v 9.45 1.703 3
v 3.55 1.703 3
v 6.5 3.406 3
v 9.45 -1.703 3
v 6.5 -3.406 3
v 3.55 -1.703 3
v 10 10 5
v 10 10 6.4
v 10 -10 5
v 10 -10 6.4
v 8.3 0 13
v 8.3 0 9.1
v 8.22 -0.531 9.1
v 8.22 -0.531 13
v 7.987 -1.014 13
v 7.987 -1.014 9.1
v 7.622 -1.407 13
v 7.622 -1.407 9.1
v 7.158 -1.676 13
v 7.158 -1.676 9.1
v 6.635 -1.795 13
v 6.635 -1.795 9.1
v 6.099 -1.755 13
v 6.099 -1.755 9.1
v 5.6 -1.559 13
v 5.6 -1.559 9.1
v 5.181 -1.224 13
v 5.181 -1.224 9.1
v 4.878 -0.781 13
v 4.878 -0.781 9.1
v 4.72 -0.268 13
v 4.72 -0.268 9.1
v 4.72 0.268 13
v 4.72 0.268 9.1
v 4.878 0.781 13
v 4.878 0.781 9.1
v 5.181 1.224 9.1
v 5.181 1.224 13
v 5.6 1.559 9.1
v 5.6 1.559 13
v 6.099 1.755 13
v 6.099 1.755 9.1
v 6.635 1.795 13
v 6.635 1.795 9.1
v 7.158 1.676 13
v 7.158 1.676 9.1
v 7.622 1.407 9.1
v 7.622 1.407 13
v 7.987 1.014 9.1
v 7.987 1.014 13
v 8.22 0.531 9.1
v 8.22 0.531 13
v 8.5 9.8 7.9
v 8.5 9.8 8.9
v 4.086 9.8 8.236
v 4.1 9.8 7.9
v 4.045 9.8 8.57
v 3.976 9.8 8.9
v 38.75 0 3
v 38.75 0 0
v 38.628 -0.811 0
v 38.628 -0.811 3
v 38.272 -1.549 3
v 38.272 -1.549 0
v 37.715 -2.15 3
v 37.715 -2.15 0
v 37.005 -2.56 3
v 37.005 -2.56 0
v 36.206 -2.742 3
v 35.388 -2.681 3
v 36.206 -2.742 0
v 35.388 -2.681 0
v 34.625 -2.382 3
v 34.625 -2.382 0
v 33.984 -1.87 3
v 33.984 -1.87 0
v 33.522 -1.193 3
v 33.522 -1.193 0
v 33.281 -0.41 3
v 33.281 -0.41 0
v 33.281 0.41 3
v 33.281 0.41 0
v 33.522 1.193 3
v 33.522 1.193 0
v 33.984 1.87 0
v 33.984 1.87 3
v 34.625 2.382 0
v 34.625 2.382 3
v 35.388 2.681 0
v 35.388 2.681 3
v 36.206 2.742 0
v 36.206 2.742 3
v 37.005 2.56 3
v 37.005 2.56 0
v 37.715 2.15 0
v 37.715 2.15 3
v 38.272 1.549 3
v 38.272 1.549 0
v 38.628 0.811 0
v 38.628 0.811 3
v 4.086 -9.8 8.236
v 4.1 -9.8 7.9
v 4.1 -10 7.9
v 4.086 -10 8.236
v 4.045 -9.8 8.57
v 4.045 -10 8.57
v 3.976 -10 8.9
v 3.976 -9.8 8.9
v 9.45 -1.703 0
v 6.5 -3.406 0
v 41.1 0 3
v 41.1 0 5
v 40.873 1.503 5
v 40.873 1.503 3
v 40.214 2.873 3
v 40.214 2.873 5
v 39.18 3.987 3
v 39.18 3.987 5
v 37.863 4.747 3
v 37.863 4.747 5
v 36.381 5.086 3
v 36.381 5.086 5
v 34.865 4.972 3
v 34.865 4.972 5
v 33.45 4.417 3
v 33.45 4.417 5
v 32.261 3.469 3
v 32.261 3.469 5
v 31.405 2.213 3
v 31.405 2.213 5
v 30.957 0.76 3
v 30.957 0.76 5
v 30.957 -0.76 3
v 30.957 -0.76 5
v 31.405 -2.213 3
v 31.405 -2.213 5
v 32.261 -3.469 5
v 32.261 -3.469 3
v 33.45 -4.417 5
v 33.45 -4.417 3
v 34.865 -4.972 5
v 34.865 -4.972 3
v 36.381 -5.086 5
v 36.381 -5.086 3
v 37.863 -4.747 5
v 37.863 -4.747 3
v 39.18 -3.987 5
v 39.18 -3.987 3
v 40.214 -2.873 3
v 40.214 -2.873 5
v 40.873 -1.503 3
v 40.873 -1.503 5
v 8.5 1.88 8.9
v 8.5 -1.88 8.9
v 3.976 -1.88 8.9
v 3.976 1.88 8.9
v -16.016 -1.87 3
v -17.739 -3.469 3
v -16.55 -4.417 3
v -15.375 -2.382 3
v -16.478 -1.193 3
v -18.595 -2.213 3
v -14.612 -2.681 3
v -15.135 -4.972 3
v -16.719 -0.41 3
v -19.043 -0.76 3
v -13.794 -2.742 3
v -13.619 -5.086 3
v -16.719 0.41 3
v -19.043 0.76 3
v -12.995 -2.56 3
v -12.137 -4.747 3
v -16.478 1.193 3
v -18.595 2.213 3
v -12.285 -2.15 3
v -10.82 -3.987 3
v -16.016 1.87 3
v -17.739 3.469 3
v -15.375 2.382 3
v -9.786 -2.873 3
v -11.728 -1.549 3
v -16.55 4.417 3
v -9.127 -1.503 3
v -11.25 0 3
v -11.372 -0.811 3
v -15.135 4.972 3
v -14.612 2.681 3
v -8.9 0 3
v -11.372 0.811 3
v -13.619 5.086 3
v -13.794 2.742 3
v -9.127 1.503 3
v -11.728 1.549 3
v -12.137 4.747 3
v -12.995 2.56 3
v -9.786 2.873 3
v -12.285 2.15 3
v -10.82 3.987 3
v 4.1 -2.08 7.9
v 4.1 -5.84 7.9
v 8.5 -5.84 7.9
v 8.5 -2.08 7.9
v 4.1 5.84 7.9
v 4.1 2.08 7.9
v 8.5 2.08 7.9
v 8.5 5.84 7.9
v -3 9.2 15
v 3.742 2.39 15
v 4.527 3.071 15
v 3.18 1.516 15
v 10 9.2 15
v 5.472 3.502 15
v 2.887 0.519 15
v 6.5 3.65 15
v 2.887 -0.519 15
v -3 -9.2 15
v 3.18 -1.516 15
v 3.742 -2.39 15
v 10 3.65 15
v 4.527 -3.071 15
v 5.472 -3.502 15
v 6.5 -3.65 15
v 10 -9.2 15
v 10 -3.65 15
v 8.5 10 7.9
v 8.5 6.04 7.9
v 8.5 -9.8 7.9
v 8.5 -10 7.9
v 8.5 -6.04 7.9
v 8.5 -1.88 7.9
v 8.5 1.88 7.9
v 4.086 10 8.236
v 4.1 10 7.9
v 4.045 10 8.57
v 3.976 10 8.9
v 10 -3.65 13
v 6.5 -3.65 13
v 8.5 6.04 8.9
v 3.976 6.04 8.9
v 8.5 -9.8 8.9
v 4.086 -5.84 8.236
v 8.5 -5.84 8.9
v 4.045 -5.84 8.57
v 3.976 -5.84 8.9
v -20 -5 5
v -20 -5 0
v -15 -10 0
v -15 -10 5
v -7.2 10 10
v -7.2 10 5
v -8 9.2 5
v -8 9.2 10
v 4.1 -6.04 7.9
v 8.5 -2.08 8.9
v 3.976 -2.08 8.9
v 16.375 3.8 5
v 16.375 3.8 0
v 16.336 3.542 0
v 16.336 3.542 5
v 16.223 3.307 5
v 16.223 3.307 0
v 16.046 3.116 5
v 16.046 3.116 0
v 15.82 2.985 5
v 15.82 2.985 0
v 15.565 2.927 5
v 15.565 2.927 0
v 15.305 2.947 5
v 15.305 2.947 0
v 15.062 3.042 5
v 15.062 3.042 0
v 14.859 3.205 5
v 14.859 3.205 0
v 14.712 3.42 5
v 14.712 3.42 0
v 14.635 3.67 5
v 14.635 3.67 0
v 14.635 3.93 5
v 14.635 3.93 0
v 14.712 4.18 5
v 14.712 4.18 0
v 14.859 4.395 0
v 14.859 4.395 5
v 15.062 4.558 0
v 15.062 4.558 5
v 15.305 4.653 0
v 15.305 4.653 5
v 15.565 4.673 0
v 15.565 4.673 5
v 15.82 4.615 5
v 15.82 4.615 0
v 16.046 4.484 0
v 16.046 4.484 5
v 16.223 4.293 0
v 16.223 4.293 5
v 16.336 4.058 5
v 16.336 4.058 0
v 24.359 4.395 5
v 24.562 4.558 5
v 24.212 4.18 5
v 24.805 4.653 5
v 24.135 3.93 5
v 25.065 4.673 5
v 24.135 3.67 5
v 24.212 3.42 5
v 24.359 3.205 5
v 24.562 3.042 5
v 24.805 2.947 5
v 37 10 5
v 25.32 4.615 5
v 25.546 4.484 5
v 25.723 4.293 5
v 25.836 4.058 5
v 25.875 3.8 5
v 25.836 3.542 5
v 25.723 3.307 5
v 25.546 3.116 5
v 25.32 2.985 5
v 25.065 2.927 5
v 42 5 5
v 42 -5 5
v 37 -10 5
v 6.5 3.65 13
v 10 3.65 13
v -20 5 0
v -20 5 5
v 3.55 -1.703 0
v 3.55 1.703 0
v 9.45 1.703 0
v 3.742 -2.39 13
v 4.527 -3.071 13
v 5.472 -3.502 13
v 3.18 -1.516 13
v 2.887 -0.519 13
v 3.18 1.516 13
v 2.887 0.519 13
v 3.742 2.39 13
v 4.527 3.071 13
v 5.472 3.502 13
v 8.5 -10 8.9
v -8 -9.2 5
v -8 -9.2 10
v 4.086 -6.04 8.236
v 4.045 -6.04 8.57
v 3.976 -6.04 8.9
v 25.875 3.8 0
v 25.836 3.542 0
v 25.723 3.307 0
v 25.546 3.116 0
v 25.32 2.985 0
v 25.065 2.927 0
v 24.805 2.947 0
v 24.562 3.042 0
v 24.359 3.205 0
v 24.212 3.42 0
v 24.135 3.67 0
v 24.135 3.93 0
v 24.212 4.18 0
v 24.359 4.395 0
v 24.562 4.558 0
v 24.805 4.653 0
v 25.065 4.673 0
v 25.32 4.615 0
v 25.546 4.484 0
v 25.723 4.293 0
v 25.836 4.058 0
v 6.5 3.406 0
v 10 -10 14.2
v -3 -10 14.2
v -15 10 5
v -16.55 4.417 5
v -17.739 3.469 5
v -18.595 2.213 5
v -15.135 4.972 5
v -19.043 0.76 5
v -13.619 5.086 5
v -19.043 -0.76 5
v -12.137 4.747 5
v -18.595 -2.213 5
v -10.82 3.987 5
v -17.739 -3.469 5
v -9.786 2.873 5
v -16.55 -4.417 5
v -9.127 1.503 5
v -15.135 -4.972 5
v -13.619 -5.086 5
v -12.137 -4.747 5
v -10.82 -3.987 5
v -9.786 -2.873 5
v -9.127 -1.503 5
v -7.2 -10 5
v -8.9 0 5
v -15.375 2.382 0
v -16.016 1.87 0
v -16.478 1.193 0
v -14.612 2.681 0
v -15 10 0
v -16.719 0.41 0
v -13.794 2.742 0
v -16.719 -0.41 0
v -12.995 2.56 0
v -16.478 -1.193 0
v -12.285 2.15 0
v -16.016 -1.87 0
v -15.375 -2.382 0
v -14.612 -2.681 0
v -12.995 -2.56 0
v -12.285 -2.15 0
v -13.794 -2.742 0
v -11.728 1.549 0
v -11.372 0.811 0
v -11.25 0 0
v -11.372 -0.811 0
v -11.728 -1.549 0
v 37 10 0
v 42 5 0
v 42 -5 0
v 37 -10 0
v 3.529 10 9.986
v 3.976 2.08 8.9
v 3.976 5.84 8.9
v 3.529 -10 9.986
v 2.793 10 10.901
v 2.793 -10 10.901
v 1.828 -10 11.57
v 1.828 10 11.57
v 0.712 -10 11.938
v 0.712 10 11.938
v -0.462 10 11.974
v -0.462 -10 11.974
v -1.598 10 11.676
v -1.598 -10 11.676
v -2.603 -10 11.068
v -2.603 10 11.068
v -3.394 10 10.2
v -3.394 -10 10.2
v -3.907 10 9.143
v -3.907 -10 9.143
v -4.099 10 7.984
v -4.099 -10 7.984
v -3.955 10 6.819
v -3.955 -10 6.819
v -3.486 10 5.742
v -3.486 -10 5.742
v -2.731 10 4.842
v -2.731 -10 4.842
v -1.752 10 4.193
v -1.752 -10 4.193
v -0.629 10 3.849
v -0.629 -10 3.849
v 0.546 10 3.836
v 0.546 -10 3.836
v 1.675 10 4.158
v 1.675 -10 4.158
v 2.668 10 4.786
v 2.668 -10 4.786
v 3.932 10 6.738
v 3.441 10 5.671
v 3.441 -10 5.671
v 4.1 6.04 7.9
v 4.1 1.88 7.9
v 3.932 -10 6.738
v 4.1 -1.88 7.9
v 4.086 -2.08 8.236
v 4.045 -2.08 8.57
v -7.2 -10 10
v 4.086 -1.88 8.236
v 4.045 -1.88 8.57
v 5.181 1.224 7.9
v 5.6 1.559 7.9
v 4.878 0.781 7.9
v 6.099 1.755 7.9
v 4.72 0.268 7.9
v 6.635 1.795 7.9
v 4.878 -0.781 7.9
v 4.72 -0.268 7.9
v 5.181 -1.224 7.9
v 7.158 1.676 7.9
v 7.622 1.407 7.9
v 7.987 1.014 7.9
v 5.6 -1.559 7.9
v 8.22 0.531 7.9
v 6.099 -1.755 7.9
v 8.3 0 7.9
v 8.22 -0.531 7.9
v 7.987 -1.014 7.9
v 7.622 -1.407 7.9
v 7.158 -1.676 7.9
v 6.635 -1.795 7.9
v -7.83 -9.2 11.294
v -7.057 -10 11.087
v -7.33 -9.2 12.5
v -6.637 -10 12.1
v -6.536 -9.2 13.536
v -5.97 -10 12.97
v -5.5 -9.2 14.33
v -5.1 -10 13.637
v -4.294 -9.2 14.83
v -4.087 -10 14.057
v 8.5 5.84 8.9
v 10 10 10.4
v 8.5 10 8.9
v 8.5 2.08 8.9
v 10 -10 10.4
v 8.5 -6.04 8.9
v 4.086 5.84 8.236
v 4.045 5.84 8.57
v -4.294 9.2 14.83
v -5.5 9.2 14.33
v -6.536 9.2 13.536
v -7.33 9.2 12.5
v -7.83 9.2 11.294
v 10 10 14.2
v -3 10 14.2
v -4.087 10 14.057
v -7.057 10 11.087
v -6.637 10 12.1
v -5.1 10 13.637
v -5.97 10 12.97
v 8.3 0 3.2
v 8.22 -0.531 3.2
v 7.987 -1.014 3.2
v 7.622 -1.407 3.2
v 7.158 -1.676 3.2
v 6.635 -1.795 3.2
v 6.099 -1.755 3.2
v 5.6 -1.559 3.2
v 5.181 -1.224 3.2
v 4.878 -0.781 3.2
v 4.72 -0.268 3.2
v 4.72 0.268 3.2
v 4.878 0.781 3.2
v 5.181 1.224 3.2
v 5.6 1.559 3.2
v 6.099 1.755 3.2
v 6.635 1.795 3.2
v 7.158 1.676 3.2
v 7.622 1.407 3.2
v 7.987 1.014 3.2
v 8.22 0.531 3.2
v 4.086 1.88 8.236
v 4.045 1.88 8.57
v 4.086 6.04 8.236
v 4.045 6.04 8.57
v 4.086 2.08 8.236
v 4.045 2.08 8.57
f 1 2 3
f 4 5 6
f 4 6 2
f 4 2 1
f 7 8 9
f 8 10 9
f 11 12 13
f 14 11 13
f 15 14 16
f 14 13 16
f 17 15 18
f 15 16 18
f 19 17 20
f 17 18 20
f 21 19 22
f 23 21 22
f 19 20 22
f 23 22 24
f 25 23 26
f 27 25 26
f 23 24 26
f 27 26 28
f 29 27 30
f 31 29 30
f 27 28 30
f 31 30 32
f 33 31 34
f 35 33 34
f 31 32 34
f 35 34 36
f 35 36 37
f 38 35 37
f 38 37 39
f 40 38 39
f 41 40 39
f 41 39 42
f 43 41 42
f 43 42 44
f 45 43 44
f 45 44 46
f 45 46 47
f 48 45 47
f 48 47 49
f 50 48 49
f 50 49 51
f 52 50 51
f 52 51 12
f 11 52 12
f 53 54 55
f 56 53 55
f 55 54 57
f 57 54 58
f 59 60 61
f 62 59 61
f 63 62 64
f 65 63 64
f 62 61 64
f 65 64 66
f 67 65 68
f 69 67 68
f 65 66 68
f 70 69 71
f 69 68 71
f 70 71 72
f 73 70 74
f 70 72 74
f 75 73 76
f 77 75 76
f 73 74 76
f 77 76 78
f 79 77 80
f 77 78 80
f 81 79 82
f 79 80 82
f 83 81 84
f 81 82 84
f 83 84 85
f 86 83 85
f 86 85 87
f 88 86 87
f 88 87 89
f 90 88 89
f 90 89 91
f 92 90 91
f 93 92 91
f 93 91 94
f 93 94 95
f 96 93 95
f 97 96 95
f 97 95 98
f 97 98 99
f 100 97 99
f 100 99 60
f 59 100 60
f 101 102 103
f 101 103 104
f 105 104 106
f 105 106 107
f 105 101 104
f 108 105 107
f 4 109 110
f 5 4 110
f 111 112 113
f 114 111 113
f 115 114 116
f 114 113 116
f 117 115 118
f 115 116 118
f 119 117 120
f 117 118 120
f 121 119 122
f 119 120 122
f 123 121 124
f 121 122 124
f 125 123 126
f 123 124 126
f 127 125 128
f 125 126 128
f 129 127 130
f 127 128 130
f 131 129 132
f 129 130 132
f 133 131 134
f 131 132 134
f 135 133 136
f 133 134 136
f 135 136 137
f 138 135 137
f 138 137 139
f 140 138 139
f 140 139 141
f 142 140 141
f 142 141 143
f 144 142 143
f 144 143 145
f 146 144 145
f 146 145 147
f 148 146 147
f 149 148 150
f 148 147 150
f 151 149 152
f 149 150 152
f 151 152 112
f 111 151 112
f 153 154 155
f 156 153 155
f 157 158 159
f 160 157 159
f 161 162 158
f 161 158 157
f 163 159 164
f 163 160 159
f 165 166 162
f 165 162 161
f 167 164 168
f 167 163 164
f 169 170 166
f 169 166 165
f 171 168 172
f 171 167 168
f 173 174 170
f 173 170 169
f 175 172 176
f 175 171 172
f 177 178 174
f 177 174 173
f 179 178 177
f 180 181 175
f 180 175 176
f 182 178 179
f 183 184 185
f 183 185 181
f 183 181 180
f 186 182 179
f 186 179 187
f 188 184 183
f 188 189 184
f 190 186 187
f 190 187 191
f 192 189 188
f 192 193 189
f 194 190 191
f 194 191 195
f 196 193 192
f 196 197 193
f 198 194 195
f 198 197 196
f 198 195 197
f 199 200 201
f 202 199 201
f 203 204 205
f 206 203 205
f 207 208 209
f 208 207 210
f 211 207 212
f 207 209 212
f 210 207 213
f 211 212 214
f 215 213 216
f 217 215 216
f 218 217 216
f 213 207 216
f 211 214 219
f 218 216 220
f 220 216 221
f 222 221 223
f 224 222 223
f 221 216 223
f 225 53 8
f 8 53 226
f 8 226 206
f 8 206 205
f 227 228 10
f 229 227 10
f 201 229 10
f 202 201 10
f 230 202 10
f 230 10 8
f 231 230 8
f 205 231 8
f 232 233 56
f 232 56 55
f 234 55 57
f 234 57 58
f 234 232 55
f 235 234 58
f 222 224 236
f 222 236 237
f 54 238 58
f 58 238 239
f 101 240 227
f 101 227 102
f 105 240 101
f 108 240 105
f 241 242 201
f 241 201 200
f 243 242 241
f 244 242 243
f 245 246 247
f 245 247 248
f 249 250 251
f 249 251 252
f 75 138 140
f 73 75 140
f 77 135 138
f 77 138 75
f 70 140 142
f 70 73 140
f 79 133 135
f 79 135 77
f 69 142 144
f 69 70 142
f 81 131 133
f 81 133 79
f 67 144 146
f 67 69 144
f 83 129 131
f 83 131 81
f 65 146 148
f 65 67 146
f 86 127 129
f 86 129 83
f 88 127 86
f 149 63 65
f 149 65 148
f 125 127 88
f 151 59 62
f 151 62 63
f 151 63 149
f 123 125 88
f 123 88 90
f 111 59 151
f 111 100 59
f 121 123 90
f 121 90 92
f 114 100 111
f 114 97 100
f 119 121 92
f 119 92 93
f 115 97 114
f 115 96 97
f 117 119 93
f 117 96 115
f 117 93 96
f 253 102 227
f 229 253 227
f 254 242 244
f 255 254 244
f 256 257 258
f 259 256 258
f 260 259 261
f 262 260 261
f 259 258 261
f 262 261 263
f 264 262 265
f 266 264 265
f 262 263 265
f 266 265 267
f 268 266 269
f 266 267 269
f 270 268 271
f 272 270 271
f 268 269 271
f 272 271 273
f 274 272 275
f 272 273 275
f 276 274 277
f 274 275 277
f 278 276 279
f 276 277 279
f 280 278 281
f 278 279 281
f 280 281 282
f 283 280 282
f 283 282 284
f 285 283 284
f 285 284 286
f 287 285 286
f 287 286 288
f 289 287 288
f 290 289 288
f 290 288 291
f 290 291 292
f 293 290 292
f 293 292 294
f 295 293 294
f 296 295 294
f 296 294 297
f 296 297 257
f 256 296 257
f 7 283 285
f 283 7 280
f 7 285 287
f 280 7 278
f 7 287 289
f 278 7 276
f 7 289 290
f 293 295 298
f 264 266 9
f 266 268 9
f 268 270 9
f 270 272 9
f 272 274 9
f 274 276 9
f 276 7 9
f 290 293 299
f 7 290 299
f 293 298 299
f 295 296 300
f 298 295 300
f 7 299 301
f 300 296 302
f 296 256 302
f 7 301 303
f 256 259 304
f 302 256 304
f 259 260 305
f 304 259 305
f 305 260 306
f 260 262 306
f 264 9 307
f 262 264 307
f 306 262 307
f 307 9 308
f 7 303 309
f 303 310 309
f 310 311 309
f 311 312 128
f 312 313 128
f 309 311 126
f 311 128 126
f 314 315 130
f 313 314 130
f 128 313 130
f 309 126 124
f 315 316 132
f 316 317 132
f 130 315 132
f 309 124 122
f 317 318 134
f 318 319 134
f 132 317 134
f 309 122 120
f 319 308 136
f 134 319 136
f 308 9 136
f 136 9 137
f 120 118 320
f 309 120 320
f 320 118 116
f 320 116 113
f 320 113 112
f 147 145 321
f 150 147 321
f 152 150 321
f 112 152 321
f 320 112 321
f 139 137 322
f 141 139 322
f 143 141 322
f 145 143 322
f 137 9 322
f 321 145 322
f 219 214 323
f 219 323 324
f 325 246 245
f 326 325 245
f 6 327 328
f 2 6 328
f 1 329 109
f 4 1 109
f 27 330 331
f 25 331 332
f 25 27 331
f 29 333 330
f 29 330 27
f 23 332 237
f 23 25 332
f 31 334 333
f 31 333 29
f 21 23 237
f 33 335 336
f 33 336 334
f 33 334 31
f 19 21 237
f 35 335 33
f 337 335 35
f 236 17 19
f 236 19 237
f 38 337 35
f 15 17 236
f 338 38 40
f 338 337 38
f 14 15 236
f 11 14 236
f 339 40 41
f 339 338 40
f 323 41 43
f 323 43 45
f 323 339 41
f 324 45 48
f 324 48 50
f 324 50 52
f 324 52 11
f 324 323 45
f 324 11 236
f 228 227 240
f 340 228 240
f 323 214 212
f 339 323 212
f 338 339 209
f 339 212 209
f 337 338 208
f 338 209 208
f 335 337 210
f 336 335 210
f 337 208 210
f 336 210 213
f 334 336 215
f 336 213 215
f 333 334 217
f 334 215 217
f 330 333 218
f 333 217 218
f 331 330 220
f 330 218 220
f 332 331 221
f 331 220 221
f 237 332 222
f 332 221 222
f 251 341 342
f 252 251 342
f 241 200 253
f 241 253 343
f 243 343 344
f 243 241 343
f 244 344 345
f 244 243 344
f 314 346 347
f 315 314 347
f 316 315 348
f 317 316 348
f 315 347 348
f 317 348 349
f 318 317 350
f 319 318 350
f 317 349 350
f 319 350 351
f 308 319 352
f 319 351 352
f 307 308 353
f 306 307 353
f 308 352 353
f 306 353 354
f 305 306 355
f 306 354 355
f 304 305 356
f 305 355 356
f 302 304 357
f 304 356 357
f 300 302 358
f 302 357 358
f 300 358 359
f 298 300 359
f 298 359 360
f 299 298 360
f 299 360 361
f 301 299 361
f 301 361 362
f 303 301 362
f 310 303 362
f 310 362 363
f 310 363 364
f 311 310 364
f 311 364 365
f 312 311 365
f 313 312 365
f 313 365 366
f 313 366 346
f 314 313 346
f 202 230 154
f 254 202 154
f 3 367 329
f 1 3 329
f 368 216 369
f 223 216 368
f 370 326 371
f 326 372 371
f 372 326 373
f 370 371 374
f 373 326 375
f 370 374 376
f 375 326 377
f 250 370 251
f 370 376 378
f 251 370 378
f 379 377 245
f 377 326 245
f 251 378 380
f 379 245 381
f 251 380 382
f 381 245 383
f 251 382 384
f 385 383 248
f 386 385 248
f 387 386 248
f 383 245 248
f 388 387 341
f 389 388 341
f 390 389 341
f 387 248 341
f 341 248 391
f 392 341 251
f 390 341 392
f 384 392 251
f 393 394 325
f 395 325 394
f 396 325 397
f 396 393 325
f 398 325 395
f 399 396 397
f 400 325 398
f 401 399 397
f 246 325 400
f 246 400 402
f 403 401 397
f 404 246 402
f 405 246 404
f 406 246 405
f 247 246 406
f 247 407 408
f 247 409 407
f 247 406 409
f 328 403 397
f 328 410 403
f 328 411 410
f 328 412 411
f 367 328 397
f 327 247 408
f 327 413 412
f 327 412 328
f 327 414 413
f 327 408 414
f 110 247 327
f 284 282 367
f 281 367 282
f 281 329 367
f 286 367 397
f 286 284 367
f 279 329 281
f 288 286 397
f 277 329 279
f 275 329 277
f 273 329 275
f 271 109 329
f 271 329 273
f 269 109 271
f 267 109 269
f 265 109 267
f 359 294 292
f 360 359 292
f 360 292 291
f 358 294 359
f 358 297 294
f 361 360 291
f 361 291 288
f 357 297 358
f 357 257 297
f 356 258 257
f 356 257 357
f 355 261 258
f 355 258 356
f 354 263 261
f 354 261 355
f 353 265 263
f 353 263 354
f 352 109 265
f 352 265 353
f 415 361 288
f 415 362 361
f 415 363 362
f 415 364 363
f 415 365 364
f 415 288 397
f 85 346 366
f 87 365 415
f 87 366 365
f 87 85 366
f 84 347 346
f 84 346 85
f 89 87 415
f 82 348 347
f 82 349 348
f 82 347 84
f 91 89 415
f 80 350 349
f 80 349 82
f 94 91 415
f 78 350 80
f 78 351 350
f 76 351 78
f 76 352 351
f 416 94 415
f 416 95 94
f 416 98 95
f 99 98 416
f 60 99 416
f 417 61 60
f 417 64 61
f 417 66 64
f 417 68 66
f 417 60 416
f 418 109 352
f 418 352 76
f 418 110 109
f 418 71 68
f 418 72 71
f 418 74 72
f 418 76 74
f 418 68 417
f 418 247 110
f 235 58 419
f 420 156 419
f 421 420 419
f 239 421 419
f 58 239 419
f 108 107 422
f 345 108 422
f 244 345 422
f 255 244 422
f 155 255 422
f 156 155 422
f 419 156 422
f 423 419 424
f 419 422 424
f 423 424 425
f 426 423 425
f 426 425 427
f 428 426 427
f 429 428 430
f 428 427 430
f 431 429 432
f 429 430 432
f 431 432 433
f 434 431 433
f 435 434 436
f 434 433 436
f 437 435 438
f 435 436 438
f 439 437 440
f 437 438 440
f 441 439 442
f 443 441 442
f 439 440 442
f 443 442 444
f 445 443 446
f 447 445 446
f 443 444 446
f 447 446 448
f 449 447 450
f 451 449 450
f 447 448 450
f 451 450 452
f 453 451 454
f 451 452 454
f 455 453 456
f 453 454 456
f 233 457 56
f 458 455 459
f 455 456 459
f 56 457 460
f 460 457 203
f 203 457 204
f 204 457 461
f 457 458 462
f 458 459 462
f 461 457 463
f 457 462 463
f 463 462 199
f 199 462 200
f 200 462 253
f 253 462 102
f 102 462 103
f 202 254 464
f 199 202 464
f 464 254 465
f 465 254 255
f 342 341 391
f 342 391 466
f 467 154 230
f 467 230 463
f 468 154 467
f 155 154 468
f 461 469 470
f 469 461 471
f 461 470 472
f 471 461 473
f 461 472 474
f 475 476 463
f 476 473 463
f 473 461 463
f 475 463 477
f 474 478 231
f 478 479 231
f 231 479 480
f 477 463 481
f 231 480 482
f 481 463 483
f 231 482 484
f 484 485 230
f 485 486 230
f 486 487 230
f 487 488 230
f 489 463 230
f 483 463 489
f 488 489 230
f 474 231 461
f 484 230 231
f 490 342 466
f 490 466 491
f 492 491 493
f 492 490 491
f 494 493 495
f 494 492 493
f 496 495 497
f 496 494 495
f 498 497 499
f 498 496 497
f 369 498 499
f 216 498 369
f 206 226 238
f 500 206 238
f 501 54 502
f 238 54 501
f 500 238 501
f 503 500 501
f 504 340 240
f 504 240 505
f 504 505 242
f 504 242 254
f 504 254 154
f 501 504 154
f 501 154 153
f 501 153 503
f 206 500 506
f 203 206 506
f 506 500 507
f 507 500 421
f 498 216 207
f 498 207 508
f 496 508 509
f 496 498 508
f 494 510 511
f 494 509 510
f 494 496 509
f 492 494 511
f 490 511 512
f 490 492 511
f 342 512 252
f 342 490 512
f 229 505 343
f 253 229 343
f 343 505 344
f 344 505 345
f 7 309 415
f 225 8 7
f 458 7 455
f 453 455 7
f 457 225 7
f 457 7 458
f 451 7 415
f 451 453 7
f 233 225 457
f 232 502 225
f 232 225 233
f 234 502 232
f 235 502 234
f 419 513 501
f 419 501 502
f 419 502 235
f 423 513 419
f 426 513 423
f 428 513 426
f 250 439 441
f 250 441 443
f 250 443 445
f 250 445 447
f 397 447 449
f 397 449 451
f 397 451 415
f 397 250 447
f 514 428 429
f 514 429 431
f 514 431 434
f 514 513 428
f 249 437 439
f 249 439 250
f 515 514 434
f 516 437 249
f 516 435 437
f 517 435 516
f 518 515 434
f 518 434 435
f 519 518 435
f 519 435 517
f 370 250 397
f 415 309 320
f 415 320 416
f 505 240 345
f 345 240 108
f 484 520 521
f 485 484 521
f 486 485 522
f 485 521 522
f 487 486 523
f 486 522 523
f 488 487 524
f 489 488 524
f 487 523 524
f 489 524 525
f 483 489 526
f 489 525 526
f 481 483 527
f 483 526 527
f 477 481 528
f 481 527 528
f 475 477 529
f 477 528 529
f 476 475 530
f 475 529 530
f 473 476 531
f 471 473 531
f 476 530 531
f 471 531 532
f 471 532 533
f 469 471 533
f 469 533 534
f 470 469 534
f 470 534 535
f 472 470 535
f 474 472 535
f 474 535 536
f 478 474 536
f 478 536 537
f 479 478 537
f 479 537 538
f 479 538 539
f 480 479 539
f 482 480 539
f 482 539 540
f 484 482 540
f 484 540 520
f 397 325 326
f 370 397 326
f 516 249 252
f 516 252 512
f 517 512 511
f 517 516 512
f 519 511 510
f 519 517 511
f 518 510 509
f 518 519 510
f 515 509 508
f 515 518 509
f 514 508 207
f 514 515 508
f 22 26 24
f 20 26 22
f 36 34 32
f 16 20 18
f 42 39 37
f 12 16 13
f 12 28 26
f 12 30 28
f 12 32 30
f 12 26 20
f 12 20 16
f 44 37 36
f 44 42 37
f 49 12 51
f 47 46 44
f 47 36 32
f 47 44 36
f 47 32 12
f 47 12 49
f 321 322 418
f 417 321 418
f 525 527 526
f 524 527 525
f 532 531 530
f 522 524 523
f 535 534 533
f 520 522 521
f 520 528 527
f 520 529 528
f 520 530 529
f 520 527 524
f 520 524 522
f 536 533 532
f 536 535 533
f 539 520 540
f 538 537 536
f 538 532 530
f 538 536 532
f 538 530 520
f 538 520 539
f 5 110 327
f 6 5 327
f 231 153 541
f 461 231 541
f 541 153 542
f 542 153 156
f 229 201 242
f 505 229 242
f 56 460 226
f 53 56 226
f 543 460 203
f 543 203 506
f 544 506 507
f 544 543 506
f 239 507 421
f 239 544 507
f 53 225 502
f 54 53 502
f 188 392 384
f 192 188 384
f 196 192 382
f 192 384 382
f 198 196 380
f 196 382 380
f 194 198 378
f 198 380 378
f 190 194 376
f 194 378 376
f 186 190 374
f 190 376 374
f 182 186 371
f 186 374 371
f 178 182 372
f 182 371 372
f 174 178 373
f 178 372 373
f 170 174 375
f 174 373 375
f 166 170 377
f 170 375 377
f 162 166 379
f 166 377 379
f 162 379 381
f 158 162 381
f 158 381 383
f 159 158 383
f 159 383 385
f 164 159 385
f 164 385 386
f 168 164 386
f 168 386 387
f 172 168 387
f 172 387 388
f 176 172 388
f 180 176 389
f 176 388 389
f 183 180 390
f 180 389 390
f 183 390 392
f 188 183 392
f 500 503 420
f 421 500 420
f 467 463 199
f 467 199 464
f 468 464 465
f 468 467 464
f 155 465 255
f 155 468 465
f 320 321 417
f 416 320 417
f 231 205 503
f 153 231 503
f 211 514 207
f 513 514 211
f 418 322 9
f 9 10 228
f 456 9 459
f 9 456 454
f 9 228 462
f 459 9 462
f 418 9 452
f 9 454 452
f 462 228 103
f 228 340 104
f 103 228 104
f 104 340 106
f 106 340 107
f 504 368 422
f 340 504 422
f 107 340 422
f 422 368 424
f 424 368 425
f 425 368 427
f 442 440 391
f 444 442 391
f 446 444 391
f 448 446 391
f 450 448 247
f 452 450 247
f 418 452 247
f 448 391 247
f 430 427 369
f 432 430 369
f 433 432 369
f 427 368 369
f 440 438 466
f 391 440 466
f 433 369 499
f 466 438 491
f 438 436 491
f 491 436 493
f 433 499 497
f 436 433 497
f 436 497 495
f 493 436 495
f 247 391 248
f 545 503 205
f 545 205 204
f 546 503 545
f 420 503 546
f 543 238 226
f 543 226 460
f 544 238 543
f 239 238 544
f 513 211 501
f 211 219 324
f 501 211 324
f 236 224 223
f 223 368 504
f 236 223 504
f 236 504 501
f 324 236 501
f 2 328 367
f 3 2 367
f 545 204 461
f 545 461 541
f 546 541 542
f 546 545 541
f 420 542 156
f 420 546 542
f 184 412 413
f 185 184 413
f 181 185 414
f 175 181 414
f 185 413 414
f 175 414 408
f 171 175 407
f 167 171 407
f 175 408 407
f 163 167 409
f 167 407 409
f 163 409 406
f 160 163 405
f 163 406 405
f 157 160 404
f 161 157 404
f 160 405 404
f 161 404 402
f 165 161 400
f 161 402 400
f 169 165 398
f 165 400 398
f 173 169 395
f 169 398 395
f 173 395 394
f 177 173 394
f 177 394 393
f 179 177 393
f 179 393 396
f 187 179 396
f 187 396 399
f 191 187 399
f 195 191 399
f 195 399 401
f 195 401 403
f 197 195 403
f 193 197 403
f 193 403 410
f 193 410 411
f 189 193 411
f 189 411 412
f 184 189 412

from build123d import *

# Parameters (mm, degrees)
PAD_DEPTH           = 10
SKETCH001_R         = 2.75
SKETCH001_R_2       = 1.8
SKETCH001_R_3       = 0.875
POCKET_DEPTH        = 15.001
POCKET001_DEPTH     = 3
SKETCH003_R         = 5.1
POCKET002_DEPTH     = 2
SKETCH004_R         = 1.9
PAD001_DEPTH        = 0.2
SKETCH005_R         = 2.95
PAD002_DEPTH        = 0.2
PAD003_DEPTH        = 0.2
LINEARPATTERN_COUNT = 6
LINEARPATTERN_PITCH = 3.96
POCKET003_DEPTH     = 2
CHAMFER_SIZE        = 5
CHAMFER001_SIZE     = 0.8


with BuildPart() as part:
    # Sketch → Pad (new body, symmetric)
    with BuildSketch(Plane.XZ):
        with BuildLine():
            ThreePointArc((3.976179, 8.9), (-4.068927, 7.396182), (4.1, 7.9))
            Line((4.1, 7.9), (8.5, 7.9))
            Line((8.5, 7.9), (10, 6.4))
            Line((10, 6.4), (10, 5))
            Line((10, 5), (42, 5))
            Line((42, 5), (42, 0))
            Line((-20, 0), (42, 0))
            Line((-20, 0), (-20, 5))
            Line((-20, 5), (-8, 5))
            Line((-8, 5), (-8, 10))
            ThreePointArc((-3, 15), (-6.535534, 13.535534), (-8, 10))
            Line((-3, 15), (10, 15))
            Line((10, 15), (10, 10.4))
            Line((8.5, 8.9), (10, 10.4))
            Line((8.5, 8.9), (3.976179, 8.9))
        make_face()
    extrude(amount=PAD_DEPTH, both=True)

    # Sketch001 → Pocket (cut, through all)
    with BuildSketch(Plane(origin=(0, 0, 0), x_dir=(1, 0, 0), z_dir=(0, 0, -1))):
        with Locations((-14, 0)):
            Circle(SKETCH001_R)
        with Locations((36, 0)):
            Circle(SKETCH001_R)
        with Locations((6.5, 0)):
            Circle(SKETCH001_R_2)
        with Locations((15.5, -3.8)):
            Circle(SKETCH001_R_3)
        with Locations((25, -3.8)):
            Circle(SKETCH001_R_3)
    extrude(amount=-POCKET_DEPTH, mode=Mode.SUBTRACT)

    # Sketch002 → Pocket001 (cut)
    with BuildSketch(Plane(origin=(0, 0, 0), x_dir=(1, 0, 0), z_dir=(0, 0, -1))):
        Polygon((6.5, 3.406367), (3.55, 1.703183), (3.55, -1.703183), (6.5, -3.406367), (9.45, -1.703183), (9.45, 1.703183), align=None)
    extrude(amount=-POCKET001_DEPTH, mode=Mode.SUBTRACT)

    # Sketch003 → Pocket002 (cut)
    with BuildSketch(Plane.XY.offset(5)):
        with Locations((36, 0)):
            Circle(SKETCH003_R)
        with Locations((-14, 0)):
            Circle(SKETCH003_R)
    extrude(amount=-POCKET002_DEPTH, mode=Mode.SUBTRACT)

    # Sketch004 → Pad001 (join)
    with BuildSketch(Plane.XY.offset(8.9)):
        with Locations((6.5, 0)):
            Circle(SKETCH004_R)
    extrude(amount=PAD001_DEPTH)

    # Sketch005 → Pad002 (join)
    with BuildSketch(Plane.XY.offset(3)):
        with Locations((6.5, 0)):
            Circle(SKETCH005_R)
    extrude(amount=PAD002_DEPTH)

    # Sketch006 → Pad003 (join)
    with BuildSketch(Plane.XZ.offset(-10)):
        with BuildLine():
            ThreePointArc((4.1, 7.9), (4.068927, 8.403818), (3.976179, 8.9))
            Line((8.5, 8.9), (3.976179, 8.9))
            Line((8.5, 7.9), (8.5, 8.9))
            Line((4.1, 7.9), (8.5, 7.9))
        make_face()
    pad003 = extrude(amount=PAD003_DEPTH)

    # LinearPattern: Pad003 ×6
    with Locations(*[(0, -i * LINEARPATTERN_PITCH, 0) for i in range(1, LINEARPATTERN_COUNT)]):
        add(pad003)

    # Sketch007 → Pocket003 (cut)
    with BuildSketch(Plane.XY.offset(15)):
        with BuildLine():
            ThreePointArc((6.5, 3.65), (2.85, 0), (6.5, -3.65))
            Line((10.5, -3.65), (6.5, -3.65))
            Line((10.5, 3.65), (10.5, -3.65))
            Line((6.5, 3.65), (10.5, 3.65))
        make_face()
    extrude(amount=-POCKET003_DEPTH, mode=Mode.SUBTRACT)

    # Chamfer
    chamfer_edges = [part.edges().sort_by_distance(p)[0] for p in [
        (-20, -10, 2.5),
        (42, -10, 2.5),
        (42, 10, 2.5),
        (-20, 10, 2.5),
    ]]
    chamfer(chamfer_edges, length=CHAMFER_SIZE)

    # Chamfer001
    chamfer001_edges = [part.edges().sort_by_distance(p)[0] for p in [
        (-8, -10, 7.5),
        (-6.535534, -10, 13.535534),
        (3.5, -10, 15),
        (3.5, 10, 15),
        (-6.535534, 10, 13.535534),
        (-8, 10, 7.5),
    ]]
    chamfer(chamfer001_edges, length=CHAMFER001_SIZE)


solid = part.part
